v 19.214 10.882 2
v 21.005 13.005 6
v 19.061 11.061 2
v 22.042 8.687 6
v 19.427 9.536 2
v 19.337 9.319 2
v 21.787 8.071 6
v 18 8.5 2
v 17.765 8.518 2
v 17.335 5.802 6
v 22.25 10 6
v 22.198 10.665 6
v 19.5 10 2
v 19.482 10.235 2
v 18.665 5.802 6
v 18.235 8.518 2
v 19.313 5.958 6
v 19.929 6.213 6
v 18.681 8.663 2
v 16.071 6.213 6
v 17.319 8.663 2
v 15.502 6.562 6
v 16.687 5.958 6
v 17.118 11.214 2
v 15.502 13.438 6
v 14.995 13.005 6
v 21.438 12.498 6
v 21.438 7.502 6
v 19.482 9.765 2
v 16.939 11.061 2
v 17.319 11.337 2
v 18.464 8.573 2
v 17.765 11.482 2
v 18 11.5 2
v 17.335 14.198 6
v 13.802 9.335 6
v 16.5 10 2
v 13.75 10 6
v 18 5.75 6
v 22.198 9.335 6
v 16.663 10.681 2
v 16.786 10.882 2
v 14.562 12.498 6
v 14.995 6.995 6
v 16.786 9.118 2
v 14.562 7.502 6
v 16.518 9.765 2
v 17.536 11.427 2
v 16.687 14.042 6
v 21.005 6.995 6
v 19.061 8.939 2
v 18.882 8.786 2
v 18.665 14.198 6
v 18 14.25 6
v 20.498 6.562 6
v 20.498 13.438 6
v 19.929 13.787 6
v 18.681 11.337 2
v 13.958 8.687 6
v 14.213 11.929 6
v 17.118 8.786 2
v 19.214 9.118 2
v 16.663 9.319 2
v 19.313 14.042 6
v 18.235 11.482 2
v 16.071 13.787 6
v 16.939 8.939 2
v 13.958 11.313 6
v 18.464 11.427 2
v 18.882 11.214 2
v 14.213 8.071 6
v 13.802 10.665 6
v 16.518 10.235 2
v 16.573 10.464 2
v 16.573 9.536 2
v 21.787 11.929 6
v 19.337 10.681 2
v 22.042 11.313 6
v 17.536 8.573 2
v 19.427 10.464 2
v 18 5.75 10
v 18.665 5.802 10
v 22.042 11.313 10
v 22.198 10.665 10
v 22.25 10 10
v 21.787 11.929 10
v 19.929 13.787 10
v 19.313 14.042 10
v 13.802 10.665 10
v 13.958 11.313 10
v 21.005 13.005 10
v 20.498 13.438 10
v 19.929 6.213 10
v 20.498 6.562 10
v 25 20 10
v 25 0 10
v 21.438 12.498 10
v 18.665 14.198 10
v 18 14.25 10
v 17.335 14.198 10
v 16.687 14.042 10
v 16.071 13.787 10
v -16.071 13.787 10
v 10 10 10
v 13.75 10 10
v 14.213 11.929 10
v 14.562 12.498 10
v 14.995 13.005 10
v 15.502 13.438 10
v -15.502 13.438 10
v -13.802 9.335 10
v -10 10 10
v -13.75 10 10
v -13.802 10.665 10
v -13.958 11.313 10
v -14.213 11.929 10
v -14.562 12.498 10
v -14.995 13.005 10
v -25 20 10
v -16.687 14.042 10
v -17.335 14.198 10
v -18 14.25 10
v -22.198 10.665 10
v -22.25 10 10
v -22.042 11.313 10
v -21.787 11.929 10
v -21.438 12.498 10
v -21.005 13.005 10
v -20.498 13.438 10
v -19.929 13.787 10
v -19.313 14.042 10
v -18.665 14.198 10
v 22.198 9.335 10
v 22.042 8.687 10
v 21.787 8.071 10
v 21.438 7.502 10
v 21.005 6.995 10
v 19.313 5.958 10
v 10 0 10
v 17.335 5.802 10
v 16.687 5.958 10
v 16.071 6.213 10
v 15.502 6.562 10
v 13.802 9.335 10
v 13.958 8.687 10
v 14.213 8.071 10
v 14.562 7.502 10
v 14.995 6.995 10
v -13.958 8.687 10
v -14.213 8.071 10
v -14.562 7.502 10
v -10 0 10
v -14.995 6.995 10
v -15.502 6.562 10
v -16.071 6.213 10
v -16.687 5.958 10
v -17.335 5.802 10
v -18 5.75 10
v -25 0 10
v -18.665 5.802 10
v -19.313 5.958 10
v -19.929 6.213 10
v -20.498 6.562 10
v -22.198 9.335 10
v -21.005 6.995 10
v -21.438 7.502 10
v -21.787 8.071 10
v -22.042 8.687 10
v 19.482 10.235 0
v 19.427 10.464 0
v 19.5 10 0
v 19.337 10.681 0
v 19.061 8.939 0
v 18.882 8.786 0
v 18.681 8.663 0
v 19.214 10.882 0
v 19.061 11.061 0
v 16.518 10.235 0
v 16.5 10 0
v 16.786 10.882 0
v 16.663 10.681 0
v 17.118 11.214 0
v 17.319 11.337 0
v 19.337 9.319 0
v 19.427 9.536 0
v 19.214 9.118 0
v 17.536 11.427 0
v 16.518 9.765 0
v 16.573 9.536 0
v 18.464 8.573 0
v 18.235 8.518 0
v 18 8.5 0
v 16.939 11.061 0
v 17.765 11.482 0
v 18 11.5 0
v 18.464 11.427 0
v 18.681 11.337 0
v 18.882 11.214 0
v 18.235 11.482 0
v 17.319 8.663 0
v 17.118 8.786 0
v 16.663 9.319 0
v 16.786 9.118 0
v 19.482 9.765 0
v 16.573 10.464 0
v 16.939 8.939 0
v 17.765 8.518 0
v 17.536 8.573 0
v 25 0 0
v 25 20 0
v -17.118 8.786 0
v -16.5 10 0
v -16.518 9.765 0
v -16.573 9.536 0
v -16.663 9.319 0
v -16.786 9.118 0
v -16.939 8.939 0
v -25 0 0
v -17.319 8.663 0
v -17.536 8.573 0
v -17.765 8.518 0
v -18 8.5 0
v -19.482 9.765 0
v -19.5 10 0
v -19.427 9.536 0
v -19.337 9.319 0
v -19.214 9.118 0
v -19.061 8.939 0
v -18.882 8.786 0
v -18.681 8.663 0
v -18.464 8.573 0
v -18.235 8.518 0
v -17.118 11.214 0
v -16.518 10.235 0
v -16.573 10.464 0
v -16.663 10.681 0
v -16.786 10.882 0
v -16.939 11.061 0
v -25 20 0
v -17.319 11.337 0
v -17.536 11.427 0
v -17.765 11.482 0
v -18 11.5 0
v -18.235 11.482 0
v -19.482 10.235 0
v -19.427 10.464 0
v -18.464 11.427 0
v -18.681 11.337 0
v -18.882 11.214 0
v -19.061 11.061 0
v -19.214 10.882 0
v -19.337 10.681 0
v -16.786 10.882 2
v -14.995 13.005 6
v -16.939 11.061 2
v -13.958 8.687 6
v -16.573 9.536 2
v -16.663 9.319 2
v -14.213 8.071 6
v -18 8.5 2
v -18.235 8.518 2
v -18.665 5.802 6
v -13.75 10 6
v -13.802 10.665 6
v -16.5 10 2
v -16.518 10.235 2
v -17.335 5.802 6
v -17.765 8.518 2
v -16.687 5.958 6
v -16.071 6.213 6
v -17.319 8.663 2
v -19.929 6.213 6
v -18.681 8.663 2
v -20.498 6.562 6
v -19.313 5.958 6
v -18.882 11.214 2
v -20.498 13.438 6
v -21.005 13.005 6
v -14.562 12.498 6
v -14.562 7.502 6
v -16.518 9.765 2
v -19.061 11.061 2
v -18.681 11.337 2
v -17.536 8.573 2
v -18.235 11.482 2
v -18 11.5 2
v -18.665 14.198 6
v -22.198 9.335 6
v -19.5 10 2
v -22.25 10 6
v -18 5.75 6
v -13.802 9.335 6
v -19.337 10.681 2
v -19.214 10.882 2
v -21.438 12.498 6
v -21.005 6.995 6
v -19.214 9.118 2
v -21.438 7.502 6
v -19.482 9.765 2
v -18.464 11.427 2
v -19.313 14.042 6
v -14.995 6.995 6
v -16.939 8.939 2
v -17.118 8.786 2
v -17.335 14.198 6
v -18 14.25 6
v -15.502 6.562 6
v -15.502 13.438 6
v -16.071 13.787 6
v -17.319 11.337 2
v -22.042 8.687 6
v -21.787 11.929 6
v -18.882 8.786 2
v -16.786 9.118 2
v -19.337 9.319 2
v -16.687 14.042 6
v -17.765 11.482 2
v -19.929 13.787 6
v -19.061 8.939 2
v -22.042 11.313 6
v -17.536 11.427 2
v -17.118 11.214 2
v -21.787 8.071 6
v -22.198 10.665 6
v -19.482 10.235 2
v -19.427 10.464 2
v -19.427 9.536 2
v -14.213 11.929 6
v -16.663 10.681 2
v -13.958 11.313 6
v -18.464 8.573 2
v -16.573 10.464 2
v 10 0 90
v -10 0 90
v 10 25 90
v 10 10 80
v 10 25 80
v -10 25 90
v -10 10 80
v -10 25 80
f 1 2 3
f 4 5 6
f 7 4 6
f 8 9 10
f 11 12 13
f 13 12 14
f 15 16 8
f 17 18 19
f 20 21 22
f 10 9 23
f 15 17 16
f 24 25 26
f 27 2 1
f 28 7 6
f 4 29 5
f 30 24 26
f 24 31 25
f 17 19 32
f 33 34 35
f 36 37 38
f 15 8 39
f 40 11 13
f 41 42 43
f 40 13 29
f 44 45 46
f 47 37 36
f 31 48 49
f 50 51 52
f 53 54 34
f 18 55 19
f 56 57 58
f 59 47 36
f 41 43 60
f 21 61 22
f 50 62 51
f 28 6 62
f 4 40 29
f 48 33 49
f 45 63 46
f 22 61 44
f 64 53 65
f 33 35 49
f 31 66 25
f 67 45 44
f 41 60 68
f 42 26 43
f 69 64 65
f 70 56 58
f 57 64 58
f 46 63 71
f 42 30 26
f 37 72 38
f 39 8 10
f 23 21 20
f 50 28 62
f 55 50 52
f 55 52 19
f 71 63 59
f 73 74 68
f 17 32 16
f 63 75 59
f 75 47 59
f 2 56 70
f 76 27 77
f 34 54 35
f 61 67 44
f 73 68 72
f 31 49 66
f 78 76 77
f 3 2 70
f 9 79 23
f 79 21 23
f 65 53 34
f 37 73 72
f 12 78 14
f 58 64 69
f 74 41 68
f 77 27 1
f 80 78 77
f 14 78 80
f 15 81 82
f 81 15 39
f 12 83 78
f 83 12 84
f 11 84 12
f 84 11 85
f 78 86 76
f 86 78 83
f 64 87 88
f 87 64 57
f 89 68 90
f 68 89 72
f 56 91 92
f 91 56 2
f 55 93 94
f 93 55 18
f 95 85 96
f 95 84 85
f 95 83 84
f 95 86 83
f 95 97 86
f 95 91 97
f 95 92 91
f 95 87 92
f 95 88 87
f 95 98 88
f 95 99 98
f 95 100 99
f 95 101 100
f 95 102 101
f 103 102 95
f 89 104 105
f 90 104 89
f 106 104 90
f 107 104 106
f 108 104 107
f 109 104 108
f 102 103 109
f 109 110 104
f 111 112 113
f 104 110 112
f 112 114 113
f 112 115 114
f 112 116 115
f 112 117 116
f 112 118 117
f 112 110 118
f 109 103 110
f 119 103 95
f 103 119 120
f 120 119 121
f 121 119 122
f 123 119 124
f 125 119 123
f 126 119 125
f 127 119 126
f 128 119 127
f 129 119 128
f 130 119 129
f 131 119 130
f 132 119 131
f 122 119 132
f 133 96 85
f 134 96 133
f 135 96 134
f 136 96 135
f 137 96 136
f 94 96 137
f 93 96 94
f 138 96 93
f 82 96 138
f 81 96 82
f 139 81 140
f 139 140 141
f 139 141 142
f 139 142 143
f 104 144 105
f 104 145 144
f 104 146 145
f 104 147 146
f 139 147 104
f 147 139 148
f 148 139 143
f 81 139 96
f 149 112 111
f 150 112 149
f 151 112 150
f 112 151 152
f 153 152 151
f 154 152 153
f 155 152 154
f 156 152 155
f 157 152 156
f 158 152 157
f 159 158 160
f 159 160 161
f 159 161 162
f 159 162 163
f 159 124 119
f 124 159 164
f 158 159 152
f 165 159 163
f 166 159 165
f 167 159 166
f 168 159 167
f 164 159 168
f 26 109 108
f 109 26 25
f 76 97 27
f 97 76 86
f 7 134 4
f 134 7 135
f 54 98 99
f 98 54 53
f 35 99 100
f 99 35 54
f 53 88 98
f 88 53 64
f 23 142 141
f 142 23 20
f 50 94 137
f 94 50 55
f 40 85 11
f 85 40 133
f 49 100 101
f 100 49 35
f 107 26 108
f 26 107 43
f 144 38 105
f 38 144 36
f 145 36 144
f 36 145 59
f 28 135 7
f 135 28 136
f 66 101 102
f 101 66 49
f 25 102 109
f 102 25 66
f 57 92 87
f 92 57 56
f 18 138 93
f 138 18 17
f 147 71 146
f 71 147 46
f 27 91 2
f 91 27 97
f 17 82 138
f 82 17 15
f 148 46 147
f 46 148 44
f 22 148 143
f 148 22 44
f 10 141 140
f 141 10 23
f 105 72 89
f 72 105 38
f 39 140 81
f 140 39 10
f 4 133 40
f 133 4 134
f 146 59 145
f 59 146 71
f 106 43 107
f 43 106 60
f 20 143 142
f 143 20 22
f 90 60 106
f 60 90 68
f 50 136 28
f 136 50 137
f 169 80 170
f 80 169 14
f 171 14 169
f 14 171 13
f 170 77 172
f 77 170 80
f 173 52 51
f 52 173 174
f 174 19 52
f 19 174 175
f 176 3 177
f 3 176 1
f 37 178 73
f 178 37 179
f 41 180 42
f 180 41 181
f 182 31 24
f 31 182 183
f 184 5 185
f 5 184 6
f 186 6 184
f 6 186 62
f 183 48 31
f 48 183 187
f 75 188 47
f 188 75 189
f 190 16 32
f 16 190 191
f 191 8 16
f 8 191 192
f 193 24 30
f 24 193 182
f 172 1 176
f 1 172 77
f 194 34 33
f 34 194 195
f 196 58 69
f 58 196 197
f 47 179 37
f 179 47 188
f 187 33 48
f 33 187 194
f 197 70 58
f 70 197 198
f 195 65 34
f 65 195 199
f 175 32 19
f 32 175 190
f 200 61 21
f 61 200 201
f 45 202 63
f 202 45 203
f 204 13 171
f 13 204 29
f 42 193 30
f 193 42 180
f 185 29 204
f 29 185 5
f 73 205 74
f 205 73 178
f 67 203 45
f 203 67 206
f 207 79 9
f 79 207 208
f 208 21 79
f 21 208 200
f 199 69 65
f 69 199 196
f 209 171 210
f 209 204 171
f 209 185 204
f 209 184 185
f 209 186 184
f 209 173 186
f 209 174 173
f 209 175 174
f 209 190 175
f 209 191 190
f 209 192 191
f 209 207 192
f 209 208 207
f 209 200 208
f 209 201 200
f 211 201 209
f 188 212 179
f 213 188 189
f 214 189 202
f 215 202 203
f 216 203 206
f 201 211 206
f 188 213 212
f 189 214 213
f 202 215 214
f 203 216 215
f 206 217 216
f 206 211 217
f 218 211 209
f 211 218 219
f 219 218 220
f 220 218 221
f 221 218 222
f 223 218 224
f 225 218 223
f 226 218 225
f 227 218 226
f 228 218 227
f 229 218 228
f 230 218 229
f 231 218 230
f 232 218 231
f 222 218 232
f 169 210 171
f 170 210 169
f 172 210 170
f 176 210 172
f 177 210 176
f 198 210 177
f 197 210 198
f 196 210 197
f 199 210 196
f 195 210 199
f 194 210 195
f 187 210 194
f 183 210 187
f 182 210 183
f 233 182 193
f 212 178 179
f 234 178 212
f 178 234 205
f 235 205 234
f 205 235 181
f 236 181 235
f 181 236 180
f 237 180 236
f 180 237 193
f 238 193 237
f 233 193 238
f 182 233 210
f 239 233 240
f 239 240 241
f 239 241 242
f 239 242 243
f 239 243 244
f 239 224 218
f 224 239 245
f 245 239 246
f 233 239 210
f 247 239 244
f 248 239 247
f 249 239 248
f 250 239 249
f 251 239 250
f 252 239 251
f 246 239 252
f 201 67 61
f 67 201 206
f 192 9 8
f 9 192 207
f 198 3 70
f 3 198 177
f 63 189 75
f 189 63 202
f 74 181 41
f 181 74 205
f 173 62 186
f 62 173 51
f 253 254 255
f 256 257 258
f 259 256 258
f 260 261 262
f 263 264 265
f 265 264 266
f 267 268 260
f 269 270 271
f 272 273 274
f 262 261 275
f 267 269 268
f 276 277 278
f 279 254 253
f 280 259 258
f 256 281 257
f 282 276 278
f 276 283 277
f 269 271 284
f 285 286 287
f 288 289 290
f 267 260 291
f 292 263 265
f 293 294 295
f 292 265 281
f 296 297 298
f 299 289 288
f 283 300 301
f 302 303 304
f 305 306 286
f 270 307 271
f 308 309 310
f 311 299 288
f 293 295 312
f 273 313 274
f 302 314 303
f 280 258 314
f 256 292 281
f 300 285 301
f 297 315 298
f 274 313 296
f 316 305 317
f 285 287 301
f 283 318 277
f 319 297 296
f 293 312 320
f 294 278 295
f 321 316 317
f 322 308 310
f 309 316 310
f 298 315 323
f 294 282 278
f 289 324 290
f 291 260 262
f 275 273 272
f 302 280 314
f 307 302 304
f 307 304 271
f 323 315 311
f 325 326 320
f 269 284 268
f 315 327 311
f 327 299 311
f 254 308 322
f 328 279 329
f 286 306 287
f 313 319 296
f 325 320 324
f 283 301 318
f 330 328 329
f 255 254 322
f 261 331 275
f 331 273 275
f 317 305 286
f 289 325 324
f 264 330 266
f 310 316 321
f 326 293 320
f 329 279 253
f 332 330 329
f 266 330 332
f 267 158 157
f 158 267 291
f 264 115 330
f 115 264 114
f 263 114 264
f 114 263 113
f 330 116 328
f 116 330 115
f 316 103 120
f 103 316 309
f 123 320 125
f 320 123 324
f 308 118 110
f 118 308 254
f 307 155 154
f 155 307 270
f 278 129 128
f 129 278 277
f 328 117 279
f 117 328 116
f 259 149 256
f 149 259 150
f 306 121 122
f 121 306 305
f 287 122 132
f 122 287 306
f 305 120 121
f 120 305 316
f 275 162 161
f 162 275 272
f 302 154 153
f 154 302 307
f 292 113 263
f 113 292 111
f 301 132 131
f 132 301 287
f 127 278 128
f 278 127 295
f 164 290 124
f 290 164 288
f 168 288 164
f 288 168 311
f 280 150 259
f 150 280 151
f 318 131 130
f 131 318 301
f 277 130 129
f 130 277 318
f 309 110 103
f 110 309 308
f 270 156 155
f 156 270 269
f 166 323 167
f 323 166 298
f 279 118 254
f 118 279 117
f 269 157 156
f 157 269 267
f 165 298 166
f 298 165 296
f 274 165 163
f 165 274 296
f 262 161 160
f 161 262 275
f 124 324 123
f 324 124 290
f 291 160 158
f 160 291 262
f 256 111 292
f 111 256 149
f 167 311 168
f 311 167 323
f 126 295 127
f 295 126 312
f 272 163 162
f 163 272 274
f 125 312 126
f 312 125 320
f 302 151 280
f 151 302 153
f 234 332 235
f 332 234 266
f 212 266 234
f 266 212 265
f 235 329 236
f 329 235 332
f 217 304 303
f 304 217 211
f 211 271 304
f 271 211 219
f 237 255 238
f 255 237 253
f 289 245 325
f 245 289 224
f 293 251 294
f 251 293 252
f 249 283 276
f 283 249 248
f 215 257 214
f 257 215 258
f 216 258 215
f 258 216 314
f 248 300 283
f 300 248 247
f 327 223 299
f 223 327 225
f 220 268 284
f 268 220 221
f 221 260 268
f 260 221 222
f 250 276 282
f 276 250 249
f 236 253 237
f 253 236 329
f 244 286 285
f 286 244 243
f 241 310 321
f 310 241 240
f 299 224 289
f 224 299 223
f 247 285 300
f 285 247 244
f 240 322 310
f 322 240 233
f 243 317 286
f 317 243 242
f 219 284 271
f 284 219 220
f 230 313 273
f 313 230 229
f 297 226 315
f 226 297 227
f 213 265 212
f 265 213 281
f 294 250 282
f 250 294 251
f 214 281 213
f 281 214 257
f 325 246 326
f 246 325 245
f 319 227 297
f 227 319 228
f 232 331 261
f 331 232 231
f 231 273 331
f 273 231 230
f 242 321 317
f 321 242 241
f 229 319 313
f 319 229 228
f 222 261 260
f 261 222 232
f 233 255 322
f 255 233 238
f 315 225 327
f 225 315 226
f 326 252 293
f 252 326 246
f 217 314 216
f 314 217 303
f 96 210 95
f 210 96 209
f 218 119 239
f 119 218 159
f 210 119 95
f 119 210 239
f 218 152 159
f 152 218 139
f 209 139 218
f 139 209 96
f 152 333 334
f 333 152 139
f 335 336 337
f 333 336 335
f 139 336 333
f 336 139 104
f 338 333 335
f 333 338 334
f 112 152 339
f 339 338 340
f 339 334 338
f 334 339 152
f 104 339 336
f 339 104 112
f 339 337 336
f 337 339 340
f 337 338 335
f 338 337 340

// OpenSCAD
//  Window Lock
$fn=40;
$arm_length = 90;

base();
translate([-10, 0, 0]) locking_arm();

//  Locking arm
module locking_arm()
{
    cube([20,10,$arm_length]);
    translate([0,10,$arm_length - 10]) cube([20,15,10]);
}

module base()
{
    difference()
    {
        translate([-25, 0, 0]) cube([50,20,10]);
        translate([18, 10, 0]) countersunk_hole();
        translate([-18, 10, 0]) countersunk_hole();
    }
}

module countersunk_hole()
{
    translate([0, 0, 2]) cylinder(h=4, d1=3, d2=8.5);
    translate([0, 0, 6]) cylinder(h=4, d=8.5);
    translate([0, 0, 0]) cylinder(h=10, d=3);
}
